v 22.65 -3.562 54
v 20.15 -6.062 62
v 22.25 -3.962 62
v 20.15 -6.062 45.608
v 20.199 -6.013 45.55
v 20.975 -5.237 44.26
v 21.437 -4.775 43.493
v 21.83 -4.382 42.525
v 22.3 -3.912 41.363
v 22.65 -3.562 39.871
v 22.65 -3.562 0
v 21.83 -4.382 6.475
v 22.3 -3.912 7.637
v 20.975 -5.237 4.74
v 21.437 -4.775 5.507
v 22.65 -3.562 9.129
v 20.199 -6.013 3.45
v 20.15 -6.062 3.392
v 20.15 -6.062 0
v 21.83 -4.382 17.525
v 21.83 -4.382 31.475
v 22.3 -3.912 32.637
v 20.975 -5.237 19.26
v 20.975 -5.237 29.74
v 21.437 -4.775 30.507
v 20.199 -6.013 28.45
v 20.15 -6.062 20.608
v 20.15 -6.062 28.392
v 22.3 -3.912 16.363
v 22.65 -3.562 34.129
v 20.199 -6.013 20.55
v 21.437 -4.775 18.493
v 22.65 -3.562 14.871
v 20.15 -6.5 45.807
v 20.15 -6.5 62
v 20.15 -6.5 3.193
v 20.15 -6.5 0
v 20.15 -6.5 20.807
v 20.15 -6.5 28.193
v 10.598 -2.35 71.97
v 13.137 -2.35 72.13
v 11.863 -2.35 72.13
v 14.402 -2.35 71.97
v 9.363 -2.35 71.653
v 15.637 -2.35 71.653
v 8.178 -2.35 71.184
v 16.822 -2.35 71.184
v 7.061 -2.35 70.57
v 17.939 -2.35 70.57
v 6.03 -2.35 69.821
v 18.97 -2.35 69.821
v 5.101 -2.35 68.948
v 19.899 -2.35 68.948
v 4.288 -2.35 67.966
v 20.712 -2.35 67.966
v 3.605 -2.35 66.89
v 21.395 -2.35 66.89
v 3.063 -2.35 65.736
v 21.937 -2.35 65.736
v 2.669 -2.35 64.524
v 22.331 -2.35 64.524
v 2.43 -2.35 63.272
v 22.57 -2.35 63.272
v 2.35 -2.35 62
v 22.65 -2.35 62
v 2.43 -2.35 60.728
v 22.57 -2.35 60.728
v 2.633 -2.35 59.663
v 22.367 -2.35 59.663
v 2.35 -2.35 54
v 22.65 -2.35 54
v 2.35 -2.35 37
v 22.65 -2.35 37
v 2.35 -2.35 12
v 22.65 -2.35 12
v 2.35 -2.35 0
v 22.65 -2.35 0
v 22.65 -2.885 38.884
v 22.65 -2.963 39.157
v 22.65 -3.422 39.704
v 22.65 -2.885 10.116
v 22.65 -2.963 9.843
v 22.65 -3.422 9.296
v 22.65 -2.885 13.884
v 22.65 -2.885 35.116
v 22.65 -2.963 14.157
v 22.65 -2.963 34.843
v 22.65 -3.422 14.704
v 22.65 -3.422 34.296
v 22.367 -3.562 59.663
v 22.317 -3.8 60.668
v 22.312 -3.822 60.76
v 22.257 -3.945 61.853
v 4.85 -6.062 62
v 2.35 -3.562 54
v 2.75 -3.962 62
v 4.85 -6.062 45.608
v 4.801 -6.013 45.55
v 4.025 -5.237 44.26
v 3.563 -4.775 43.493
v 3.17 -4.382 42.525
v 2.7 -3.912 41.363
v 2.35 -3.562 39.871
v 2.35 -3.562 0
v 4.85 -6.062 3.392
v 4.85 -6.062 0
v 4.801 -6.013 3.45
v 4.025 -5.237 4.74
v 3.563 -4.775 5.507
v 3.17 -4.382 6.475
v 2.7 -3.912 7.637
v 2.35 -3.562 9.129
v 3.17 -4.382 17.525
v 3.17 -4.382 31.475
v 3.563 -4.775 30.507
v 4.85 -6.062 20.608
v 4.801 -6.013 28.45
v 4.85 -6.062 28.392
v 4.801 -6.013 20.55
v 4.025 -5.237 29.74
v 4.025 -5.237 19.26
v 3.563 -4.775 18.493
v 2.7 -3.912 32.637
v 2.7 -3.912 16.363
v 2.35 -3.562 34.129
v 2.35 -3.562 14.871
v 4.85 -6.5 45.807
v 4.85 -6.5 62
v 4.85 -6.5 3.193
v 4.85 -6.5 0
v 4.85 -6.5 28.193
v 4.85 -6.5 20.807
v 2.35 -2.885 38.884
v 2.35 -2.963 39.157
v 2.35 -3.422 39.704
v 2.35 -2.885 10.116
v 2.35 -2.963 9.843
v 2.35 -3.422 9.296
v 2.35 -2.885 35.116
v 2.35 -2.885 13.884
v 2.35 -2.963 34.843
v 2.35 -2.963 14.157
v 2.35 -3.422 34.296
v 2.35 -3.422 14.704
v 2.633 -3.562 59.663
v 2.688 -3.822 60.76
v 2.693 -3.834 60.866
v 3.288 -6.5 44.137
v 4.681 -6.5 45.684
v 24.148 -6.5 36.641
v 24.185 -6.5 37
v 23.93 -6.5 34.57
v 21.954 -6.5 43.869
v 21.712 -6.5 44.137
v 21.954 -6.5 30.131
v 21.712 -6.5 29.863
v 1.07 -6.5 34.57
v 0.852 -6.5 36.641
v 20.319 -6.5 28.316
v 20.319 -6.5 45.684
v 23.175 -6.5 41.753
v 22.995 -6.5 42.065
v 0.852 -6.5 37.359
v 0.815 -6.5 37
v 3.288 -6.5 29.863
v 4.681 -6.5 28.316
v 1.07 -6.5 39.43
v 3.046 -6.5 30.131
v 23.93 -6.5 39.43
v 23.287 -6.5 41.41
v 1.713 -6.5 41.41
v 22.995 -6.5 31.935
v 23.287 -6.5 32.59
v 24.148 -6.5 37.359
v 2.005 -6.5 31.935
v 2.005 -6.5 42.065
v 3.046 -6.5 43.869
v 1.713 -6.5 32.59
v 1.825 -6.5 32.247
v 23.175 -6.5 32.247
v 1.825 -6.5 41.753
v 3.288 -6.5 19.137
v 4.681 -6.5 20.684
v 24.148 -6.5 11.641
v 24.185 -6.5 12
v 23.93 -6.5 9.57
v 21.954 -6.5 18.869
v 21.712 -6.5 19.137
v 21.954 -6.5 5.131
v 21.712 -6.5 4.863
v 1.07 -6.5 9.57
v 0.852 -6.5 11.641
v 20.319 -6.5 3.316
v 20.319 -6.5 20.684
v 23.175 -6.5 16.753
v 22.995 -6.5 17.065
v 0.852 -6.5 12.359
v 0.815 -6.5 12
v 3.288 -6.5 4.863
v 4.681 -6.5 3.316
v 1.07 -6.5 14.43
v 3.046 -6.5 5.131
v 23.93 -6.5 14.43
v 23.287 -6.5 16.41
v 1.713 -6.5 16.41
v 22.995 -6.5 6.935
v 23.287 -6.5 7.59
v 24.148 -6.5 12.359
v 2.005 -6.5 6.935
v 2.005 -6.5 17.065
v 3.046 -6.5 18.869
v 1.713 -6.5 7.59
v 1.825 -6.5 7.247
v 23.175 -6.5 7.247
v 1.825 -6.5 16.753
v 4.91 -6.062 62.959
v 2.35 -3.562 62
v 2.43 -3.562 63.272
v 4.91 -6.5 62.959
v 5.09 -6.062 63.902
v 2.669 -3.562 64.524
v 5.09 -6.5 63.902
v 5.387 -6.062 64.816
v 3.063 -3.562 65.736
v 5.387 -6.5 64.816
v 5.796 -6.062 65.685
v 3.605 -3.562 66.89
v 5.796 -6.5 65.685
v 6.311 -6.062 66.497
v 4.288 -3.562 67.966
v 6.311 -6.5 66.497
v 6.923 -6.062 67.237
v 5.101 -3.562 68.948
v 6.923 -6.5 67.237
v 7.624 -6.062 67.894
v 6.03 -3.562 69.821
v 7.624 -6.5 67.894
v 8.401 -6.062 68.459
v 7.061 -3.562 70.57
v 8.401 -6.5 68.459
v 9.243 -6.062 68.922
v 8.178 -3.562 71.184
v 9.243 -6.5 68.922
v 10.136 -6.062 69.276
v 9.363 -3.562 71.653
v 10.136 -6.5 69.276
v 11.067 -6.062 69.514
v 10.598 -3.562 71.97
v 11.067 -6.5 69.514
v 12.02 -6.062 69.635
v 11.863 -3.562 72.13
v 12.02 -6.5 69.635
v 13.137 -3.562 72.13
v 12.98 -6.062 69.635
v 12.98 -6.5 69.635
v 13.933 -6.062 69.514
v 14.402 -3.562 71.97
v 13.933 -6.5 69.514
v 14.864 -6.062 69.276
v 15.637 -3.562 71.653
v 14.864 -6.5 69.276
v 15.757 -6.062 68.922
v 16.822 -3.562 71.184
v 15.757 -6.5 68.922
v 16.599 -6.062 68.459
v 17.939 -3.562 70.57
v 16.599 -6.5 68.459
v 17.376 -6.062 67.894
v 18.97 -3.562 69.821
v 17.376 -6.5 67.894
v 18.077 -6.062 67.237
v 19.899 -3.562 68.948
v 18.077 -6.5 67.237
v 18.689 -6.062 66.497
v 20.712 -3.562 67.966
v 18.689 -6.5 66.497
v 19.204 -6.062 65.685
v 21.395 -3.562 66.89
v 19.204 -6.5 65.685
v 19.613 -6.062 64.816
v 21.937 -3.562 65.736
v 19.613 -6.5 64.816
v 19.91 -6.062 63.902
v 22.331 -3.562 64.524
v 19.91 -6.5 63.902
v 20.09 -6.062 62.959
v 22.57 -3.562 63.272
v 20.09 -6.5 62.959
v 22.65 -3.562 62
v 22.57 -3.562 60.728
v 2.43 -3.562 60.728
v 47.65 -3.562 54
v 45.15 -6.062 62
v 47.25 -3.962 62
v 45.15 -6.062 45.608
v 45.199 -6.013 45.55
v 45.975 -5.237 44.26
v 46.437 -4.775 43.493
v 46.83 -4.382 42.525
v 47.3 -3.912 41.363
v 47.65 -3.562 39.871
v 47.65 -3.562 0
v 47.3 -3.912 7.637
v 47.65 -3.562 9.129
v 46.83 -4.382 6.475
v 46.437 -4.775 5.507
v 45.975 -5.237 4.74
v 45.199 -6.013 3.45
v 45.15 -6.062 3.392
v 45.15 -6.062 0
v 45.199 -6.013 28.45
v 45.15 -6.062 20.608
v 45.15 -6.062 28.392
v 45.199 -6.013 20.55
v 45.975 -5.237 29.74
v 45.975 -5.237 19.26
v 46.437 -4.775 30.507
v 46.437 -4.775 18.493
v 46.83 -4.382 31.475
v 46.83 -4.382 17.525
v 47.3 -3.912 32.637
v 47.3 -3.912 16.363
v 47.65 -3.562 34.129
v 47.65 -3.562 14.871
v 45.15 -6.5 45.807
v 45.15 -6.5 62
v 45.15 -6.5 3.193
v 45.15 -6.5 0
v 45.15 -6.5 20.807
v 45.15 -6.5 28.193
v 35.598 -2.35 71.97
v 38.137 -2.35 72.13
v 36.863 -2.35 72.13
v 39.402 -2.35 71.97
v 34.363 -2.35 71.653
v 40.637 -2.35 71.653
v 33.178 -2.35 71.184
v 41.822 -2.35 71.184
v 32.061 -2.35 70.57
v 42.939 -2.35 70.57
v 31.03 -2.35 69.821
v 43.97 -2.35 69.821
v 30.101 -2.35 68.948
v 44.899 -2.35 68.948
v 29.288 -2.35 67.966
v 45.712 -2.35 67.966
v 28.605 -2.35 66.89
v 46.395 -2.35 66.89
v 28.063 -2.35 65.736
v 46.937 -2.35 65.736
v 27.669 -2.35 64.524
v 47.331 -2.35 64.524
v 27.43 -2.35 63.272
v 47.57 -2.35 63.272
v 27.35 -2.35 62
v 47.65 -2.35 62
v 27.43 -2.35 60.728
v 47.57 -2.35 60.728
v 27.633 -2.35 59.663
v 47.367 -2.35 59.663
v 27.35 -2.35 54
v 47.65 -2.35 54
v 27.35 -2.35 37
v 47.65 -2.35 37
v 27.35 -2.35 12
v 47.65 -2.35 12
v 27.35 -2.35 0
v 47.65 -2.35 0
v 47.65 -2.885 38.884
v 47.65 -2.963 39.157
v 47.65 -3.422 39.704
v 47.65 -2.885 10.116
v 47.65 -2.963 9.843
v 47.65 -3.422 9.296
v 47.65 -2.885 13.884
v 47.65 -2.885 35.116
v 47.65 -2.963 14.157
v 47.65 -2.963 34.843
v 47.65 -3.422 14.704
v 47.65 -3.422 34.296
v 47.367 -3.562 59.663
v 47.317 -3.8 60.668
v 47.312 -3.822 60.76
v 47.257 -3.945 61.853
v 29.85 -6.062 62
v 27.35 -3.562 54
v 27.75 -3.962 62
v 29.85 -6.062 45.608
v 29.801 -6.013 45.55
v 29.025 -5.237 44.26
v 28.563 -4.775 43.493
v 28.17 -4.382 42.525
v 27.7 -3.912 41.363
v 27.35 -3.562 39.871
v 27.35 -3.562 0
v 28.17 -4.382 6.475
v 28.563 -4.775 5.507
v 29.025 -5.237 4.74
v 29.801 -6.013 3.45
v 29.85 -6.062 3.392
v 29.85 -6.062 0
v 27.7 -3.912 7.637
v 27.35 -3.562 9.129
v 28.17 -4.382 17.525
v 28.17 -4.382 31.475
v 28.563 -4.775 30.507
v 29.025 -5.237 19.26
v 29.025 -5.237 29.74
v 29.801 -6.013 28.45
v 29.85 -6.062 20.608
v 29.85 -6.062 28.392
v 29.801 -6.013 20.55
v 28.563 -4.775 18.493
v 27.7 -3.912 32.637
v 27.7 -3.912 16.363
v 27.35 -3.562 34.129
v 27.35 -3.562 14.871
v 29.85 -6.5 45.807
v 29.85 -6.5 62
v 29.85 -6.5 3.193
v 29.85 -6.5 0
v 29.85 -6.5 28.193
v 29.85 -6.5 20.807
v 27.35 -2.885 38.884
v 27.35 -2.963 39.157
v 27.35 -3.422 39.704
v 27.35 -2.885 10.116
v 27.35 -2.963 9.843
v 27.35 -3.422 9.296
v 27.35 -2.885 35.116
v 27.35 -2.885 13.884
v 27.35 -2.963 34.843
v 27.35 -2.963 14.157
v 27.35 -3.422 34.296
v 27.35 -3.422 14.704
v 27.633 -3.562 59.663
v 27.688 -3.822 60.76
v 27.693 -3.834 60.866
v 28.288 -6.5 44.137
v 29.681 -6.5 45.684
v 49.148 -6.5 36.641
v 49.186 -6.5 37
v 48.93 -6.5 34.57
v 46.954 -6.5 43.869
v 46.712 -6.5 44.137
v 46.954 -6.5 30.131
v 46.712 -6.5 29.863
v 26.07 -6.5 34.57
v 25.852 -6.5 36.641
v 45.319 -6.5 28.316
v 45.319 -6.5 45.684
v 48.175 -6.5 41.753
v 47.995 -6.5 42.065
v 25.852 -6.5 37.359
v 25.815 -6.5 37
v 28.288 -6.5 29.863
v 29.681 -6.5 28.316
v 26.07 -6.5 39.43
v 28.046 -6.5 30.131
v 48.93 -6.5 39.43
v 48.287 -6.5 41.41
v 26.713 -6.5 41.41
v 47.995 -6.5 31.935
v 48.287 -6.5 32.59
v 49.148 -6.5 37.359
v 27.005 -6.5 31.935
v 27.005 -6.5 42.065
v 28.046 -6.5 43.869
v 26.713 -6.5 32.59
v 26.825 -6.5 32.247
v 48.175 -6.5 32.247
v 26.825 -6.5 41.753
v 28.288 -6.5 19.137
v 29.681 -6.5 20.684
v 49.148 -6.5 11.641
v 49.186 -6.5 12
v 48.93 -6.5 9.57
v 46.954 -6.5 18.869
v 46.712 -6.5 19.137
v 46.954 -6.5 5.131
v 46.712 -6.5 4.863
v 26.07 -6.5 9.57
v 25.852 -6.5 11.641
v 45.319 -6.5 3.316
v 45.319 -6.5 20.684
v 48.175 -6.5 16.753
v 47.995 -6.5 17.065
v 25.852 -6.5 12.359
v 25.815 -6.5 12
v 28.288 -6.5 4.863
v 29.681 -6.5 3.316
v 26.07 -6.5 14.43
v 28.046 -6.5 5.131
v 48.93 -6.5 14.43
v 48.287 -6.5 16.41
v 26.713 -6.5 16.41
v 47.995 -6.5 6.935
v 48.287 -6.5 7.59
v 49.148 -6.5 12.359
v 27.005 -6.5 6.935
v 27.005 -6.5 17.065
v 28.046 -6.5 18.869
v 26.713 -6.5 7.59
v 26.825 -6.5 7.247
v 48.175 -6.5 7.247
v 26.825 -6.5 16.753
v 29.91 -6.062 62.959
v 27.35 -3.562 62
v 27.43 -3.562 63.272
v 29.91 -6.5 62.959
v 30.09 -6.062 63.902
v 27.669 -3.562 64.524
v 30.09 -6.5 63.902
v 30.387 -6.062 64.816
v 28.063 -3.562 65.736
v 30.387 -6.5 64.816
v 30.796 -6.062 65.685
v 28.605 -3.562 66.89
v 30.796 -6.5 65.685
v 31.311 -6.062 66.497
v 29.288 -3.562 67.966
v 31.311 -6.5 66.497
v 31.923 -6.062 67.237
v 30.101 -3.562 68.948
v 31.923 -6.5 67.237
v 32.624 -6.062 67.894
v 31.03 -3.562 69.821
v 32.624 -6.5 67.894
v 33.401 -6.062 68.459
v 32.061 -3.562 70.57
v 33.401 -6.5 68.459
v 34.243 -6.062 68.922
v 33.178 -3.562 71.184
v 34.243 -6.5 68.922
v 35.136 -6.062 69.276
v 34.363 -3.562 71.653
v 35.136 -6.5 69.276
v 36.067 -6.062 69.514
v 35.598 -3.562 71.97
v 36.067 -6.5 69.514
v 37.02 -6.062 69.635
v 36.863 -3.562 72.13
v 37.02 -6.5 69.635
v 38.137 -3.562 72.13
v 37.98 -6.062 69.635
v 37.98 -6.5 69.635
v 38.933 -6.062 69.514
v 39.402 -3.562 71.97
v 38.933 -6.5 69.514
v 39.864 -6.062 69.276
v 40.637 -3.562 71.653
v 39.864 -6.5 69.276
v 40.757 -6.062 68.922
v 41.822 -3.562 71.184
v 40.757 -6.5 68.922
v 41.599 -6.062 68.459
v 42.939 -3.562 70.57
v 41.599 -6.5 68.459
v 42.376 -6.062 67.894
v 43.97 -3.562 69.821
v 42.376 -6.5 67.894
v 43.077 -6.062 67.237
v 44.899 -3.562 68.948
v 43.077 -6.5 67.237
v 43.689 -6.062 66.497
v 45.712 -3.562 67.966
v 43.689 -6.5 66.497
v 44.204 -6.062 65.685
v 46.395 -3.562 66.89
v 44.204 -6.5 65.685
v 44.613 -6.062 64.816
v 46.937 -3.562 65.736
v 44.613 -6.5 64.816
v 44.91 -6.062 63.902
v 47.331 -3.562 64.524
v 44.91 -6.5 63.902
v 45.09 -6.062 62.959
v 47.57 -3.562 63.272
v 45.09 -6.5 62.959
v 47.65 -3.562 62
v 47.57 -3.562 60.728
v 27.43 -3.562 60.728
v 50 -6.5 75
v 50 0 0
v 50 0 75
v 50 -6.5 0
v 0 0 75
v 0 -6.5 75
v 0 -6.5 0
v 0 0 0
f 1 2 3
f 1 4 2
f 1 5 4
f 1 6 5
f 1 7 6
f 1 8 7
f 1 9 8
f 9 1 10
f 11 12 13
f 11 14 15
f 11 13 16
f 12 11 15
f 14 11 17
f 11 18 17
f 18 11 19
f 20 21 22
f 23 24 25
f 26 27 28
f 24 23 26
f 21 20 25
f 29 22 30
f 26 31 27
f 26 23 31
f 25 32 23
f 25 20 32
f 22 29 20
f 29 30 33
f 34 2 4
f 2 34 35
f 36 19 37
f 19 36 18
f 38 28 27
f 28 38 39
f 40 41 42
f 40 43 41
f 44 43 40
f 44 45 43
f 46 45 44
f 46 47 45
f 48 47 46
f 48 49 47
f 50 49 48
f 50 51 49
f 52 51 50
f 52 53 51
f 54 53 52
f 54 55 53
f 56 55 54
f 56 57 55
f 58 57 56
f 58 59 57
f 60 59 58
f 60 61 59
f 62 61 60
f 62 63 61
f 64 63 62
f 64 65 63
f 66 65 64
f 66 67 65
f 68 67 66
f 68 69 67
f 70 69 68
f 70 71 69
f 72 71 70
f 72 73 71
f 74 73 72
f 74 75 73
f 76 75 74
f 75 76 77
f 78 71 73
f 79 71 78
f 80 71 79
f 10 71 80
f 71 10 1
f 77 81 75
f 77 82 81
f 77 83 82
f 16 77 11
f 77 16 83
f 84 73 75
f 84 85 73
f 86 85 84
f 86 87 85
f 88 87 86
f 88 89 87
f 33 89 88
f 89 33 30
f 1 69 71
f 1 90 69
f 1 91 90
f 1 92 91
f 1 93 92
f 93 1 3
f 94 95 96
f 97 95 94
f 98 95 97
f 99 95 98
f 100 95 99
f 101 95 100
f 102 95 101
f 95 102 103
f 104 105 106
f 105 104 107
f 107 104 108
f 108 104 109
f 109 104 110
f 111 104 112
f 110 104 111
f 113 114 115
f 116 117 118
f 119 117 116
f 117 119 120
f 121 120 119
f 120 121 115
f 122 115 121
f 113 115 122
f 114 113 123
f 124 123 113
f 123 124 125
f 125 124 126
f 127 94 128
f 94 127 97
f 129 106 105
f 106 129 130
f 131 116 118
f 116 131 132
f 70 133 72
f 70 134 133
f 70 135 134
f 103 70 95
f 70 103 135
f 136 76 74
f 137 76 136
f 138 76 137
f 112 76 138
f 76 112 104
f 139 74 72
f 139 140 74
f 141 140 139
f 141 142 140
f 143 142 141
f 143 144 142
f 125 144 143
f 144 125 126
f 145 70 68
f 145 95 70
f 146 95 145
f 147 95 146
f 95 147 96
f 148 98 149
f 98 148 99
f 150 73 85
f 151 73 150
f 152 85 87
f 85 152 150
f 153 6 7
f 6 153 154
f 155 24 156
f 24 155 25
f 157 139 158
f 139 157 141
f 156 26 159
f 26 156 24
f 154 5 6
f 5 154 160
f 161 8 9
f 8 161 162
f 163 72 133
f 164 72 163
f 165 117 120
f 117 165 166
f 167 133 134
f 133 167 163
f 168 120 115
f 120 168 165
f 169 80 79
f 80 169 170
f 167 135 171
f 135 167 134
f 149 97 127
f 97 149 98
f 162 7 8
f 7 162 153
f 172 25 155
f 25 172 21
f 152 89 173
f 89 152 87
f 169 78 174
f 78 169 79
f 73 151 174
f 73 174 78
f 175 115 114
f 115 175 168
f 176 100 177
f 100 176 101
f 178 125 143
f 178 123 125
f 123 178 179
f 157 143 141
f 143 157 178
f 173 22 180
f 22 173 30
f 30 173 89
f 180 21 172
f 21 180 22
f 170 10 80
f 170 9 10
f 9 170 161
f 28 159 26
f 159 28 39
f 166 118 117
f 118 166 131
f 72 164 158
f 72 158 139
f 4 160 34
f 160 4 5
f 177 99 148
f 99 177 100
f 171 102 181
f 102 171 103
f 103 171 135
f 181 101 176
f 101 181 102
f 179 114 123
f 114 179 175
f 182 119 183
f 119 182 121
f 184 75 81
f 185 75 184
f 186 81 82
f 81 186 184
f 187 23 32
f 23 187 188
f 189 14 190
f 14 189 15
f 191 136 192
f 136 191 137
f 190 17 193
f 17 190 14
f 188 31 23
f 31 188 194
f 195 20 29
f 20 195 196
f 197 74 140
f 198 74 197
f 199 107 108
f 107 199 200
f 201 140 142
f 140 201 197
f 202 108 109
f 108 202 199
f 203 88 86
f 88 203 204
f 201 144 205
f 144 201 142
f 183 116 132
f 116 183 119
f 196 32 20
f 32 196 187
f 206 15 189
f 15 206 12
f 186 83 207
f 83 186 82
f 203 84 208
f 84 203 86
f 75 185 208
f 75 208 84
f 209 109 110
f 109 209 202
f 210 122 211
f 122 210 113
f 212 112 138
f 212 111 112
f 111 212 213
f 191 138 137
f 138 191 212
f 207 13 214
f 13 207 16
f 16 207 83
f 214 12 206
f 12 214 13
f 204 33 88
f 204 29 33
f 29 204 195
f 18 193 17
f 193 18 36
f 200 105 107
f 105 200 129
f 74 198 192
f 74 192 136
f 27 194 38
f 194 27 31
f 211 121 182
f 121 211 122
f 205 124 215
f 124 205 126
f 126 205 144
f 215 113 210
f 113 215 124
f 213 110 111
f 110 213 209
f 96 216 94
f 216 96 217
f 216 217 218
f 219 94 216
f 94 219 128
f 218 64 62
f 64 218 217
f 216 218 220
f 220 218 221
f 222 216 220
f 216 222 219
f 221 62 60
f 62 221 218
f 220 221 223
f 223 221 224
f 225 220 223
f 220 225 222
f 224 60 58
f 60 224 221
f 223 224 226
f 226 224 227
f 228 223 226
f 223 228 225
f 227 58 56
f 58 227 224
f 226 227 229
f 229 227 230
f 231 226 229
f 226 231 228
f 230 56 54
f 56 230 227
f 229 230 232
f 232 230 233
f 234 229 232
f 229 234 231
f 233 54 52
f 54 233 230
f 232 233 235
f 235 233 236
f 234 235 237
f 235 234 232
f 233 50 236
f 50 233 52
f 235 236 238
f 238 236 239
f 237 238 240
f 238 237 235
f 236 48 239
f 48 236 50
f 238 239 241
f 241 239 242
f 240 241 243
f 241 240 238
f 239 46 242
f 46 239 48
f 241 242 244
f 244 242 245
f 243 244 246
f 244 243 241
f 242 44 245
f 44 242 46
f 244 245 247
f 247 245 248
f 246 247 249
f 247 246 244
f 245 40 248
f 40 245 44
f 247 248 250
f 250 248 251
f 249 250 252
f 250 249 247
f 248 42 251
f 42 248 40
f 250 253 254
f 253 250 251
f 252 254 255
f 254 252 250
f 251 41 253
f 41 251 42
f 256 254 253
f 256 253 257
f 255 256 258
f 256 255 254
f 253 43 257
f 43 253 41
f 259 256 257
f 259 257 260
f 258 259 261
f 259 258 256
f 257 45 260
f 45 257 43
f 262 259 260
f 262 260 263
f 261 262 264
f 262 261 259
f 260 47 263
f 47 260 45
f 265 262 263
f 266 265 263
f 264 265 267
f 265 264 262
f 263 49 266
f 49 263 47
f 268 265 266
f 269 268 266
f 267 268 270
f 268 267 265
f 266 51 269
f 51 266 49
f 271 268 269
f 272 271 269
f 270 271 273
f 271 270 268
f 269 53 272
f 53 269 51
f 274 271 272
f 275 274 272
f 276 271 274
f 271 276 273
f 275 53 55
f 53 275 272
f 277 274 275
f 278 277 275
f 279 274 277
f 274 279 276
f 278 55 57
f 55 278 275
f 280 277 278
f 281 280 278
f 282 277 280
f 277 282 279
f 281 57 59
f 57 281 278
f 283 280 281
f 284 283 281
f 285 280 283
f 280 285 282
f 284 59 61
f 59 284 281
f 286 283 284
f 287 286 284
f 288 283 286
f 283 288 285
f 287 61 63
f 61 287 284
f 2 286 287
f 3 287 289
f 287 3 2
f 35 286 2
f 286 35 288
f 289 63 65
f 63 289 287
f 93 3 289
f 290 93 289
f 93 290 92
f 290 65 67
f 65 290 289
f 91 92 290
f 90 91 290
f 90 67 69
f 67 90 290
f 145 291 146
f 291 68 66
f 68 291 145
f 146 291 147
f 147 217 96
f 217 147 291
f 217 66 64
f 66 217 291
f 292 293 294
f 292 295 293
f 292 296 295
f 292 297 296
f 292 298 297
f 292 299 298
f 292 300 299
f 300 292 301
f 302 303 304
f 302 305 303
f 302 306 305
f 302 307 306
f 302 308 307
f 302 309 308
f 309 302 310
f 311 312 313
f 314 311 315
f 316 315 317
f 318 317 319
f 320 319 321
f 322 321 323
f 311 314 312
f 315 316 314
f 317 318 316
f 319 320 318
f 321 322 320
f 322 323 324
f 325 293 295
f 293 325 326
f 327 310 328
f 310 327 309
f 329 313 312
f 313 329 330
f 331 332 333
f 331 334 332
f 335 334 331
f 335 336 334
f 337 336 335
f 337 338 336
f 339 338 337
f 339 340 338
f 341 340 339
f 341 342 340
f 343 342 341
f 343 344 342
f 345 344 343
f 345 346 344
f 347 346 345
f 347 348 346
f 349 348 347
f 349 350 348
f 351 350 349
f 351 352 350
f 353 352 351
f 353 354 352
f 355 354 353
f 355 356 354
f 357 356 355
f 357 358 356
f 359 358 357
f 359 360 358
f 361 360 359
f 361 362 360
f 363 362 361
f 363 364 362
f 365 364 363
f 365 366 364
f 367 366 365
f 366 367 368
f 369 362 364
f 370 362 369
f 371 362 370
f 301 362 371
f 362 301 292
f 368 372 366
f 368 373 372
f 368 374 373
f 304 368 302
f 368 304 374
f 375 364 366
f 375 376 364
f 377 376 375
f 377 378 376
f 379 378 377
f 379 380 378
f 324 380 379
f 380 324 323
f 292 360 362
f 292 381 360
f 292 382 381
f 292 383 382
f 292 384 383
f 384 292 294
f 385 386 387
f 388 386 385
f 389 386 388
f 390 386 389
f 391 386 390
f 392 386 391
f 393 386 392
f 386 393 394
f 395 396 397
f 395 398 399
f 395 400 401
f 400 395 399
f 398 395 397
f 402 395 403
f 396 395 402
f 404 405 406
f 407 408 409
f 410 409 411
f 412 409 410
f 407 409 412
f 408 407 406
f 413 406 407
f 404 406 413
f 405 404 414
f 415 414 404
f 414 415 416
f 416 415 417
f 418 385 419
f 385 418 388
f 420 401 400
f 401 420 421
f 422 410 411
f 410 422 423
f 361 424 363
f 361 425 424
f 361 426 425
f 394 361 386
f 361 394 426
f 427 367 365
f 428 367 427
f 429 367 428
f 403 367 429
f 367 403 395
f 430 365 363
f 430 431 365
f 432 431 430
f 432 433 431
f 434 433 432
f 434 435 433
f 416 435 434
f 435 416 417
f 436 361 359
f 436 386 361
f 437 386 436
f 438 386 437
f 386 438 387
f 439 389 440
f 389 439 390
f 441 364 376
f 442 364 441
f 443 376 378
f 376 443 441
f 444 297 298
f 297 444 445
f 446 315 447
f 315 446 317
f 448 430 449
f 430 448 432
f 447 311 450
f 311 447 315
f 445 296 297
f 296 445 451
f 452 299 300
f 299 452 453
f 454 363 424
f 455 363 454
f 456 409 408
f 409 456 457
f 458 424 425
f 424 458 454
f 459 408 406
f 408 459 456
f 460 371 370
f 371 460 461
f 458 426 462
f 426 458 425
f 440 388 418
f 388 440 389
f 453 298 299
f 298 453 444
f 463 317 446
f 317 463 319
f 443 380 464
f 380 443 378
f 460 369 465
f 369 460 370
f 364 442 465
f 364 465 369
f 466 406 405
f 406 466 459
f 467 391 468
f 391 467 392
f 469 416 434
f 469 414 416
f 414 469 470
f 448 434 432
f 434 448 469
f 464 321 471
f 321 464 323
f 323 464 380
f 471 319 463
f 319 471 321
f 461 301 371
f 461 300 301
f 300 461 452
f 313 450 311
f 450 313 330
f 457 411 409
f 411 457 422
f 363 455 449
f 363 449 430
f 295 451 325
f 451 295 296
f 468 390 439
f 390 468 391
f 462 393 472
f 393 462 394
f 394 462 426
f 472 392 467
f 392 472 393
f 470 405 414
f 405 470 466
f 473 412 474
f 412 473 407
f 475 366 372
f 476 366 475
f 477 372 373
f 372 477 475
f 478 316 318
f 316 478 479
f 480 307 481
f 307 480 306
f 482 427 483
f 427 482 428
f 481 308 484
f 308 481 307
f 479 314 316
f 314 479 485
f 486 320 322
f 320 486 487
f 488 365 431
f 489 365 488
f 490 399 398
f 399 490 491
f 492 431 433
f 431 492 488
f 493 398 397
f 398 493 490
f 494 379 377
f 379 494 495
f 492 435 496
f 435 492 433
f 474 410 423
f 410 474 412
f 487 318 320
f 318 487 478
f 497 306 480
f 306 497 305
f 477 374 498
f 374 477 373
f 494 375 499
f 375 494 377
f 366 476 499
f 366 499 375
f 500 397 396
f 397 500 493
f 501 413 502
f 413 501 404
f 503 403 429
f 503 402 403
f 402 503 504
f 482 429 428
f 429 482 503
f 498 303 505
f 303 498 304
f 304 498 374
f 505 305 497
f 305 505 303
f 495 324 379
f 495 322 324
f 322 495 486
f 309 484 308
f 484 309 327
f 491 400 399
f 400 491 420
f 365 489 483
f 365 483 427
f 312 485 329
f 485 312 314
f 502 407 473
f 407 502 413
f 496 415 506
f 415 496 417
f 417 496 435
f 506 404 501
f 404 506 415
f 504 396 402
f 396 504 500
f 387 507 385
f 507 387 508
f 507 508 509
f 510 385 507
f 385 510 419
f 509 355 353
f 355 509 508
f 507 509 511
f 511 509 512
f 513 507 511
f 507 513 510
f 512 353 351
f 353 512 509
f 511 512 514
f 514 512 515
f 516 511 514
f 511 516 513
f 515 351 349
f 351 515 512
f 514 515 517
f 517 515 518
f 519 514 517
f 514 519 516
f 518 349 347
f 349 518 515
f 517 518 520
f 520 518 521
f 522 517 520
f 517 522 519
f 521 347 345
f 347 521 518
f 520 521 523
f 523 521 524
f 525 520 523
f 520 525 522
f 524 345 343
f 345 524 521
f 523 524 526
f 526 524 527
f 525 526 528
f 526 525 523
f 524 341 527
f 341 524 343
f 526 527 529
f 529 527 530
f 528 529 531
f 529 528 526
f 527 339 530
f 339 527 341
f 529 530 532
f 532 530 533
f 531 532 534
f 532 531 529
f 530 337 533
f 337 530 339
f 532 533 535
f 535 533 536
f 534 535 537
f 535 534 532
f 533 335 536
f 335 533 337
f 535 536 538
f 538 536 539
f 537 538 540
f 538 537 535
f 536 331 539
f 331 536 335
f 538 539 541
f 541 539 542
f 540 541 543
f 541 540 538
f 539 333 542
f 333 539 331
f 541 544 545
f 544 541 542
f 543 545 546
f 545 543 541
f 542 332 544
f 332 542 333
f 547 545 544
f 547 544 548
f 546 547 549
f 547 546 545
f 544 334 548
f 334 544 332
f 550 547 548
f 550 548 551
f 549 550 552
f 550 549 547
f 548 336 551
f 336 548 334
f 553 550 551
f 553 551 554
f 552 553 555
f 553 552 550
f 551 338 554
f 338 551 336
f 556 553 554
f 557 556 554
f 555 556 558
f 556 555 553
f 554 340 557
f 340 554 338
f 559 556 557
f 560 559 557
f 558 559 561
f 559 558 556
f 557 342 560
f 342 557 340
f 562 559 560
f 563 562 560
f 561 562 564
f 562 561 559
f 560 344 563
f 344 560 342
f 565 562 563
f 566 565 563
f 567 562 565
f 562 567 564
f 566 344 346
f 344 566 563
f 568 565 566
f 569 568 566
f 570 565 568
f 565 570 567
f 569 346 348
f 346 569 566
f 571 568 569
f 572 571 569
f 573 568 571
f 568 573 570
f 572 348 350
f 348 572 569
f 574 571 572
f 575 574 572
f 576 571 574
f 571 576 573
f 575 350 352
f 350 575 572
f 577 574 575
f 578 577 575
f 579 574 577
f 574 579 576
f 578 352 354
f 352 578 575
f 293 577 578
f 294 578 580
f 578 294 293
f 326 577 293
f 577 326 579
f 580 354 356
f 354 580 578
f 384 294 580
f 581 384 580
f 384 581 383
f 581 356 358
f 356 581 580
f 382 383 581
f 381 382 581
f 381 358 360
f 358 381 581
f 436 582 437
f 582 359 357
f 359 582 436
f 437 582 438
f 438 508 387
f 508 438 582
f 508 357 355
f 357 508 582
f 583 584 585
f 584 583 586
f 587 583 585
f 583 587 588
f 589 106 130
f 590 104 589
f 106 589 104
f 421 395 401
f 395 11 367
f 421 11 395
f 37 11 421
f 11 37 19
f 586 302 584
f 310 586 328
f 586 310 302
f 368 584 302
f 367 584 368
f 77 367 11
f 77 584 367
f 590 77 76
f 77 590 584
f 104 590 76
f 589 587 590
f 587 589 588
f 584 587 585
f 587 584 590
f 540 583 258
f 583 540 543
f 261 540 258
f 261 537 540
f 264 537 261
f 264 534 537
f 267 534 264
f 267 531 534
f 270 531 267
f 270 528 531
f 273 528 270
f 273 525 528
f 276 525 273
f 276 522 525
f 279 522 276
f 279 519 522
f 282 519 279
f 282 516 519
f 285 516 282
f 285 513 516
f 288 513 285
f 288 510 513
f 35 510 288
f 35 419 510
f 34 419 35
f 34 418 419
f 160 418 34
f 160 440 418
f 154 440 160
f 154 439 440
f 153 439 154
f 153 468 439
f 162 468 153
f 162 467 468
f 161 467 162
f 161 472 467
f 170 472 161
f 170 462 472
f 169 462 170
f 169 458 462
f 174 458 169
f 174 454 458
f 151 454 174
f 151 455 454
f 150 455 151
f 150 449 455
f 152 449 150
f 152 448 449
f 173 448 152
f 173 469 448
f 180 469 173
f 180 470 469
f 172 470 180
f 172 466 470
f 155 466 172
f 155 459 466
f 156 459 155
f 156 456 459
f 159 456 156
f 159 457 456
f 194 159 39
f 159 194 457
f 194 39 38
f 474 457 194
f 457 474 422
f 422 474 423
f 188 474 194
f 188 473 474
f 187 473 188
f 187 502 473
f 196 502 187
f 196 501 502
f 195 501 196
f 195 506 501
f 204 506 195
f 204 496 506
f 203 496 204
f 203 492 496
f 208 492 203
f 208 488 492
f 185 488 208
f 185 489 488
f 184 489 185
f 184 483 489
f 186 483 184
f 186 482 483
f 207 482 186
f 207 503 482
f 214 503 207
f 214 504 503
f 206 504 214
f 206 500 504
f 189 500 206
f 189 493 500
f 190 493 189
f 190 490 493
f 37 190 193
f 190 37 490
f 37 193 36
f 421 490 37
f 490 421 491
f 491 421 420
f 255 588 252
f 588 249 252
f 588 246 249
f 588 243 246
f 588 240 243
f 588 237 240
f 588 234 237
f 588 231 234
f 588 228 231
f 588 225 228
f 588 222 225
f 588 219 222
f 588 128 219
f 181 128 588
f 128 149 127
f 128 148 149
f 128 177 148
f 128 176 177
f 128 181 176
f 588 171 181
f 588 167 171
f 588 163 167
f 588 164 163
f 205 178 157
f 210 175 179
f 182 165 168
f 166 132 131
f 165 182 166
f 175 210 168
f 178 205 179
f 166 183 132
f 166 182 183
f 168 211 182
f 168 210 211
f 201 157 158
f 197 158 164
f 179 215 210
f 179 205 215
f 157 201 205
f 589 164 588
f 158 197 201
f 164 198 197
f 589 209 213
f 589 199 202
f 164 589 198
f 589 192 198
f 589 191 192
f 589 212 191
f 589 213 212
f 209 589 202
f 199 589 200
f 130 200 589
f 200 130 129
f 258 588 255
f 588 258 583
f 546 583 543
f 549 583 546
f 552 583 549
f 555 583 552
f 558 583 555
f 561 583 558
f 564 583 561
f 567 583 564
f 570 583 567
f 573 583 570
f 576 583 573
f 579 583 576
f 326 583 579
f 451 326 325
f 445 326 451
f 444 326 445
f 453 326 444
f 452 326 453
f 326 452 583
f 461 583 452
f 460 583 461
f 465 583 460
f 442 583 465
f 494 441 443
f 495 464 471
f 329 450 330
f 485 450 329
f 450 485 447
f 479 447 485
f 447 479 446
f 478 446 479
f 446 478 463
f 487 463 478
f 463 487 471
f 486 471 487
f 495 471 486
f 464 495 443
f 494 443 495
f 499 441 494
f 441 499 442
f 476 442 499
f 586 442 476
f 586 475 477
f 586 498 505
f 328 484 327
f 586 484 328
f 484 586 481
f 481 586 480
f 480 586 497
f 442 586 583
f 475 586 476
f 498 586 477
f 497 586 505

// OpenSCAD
/*This file is the master copy of the multiconnect slot back. 
All components of this file are required in any file using this backer
*/

totalWidth = 50;
totalHeight = 75;

/*[Slot Customization]*/
// Version of multiconnect (dimple or snap)
multiConnectVersion = "v2"; // [v1, v2]
//Distance between Multiconnect slots on the back (25mm is standard for MultiBoard)
distanceBetweenSlots = 25;
//QuickRelease removes the small indent in the top of the slots that lock the part into place
slotQuickRelease = false;
//Dimple scale tweaks the size of the dimple in the slot for printers that need a larger dimple to print correctly
dimpleScale = 1; //[0.5:.05:1.5]
//Scale the size of slots in the back (1.015 scale is default for a tight fit. Increase if your finding poor fit. )
slotTolerance = 1.00; //[0.925:0.005:1.075]
//Move the slot in (positive) or out (negative)
slotDepthMicroadjustment = 0; //[-.5:0.05:.5]
//enable a slot on-ramp for easy mounting of tall items
onRampEnabled = true;
//frequency of slots for on-ramp. 1 = every slot; 2 = every 2 slots; etc.
onRampEveryXSlots = 1;

/* [Hidden] */

multiconnectBack(backWidth = totalWidth, backHeight = totalHeight, distanceBetweenSlots = distanceBetweenSlots);

//BEGIN MODULES
//Slotted back Module
module multiconnectBack(backWidth, backHeight, distanceBetweenSlots)
{
    //slot count calculates how many slots can fit on the back. Based on internal width for buffer. 
    //slot width needs to be at least the distance between slot for at least 1 slot to generate
    let (backWidth = max(backWidth,distanceBetweenSlots), backHeight = max(backHeight, 25),slotCount = floor(backWidth/distanceBetweenSlots), backThickness = 6.5){
        difference() {
            translate(v = [0,-backThickness,0]) cube(size = [backWidth,backThickness,backHeight]);
            //Loop through slots and center on the item
            //Note: I kept doing math until it looked right. It's possible this can be simplified.
            for (slotNum = [0:1:slotCount-1]) {
                translate(v = [distanceBetweenSlots/2+(backWidth/distanceBetweenSlots-slotCount)*distanceBetweenSlots/2+slotNum*distanceBetweenSlots,-2.35+slotDepthMicroadjustment,backHeight-13]) {
                    color(c = "red")  slotTool(backHeight);
                }
            }
        }
    }
    //Create Slot Tool
    module slotTool(totalHeight) {
        scale(v = slotTolerance)
        //slot minus optional dimple with optional on-ramp
        let (slotProfile = [[0,0],[10.15,0],[10.15,1.2121],[7.65,3.712],[7.65,5],[0,5]])
        difference() {
            union() {
                //round top
                rotate(a = [90,0,0,]) 
                    rotate_extrude($fn=50) 
                        polygon(points = slotProfile);
                //long slot
                translate(v = [0,0,0]) 
                    rotate(a = [180,0,0]) 
                    union(){
                        difference() {
                            // Main half slot
                            linear_extrude(height = totalHeight+1) 
                                polygon(points = slotProfile);
                            
                            // Snap cutout
                            if (slotQuickRelease == false && multiConnectVersion == "v2")
                                translate(v= [10.15,0,0])
                                rotate(a= [-90,0,0])
                                linear_extrude(height = 5)  // match slot height (5mm)
                                    polygon(points = [[0,0],[-0.4,0],[0,-8]]);  // triangle polygon with multiconnect v2 specs
                            }

                        mirror([1,0,0])
                            difference() {
                                // Main half slot
                                linear_extrude(height = totalHeight+1) 
                                    polygon(points = slotProfile);
                                
                                // Snap cutout
                                if (slotQuickRelease == false && multiConnectVersion == "v2")
                                    translate(v= [10.15,0,0])
                                    rotate(a= [-90,0,0])
                                    linear_extrude(height = 5)  // match slot height (5mm)
                                        polygon(points = [[0,0],[-0.4,0],[0,-8]]);  // triangle polygon with multiconnect v2 spec
                            }
                    }
                //on-ramp
                if(onRampEnabled)
                    for(y = [1:onRampEveryXSlots:totalHeight/distanceBetweenSlots])
                        translate(v = [0,-5,-y*distanceBetweenSlots]) 
                            rotate(a = [-90,0,0]) 
                                color(c = "orange") cylinder(h = 5, r1 = 12, r2 = 10.15);
            }
            //dimple
            if (slotQuickRelease == false && multiConnectVersion == "v1")
                scale(v = dimpleScale) 
                rotate(a = [90,0,0,]) 
                    rotate_extrude($fn=50) 
                        polygon(points = [[0,0],[0,1.5],[1.5,0]]);
        }
    }
}
